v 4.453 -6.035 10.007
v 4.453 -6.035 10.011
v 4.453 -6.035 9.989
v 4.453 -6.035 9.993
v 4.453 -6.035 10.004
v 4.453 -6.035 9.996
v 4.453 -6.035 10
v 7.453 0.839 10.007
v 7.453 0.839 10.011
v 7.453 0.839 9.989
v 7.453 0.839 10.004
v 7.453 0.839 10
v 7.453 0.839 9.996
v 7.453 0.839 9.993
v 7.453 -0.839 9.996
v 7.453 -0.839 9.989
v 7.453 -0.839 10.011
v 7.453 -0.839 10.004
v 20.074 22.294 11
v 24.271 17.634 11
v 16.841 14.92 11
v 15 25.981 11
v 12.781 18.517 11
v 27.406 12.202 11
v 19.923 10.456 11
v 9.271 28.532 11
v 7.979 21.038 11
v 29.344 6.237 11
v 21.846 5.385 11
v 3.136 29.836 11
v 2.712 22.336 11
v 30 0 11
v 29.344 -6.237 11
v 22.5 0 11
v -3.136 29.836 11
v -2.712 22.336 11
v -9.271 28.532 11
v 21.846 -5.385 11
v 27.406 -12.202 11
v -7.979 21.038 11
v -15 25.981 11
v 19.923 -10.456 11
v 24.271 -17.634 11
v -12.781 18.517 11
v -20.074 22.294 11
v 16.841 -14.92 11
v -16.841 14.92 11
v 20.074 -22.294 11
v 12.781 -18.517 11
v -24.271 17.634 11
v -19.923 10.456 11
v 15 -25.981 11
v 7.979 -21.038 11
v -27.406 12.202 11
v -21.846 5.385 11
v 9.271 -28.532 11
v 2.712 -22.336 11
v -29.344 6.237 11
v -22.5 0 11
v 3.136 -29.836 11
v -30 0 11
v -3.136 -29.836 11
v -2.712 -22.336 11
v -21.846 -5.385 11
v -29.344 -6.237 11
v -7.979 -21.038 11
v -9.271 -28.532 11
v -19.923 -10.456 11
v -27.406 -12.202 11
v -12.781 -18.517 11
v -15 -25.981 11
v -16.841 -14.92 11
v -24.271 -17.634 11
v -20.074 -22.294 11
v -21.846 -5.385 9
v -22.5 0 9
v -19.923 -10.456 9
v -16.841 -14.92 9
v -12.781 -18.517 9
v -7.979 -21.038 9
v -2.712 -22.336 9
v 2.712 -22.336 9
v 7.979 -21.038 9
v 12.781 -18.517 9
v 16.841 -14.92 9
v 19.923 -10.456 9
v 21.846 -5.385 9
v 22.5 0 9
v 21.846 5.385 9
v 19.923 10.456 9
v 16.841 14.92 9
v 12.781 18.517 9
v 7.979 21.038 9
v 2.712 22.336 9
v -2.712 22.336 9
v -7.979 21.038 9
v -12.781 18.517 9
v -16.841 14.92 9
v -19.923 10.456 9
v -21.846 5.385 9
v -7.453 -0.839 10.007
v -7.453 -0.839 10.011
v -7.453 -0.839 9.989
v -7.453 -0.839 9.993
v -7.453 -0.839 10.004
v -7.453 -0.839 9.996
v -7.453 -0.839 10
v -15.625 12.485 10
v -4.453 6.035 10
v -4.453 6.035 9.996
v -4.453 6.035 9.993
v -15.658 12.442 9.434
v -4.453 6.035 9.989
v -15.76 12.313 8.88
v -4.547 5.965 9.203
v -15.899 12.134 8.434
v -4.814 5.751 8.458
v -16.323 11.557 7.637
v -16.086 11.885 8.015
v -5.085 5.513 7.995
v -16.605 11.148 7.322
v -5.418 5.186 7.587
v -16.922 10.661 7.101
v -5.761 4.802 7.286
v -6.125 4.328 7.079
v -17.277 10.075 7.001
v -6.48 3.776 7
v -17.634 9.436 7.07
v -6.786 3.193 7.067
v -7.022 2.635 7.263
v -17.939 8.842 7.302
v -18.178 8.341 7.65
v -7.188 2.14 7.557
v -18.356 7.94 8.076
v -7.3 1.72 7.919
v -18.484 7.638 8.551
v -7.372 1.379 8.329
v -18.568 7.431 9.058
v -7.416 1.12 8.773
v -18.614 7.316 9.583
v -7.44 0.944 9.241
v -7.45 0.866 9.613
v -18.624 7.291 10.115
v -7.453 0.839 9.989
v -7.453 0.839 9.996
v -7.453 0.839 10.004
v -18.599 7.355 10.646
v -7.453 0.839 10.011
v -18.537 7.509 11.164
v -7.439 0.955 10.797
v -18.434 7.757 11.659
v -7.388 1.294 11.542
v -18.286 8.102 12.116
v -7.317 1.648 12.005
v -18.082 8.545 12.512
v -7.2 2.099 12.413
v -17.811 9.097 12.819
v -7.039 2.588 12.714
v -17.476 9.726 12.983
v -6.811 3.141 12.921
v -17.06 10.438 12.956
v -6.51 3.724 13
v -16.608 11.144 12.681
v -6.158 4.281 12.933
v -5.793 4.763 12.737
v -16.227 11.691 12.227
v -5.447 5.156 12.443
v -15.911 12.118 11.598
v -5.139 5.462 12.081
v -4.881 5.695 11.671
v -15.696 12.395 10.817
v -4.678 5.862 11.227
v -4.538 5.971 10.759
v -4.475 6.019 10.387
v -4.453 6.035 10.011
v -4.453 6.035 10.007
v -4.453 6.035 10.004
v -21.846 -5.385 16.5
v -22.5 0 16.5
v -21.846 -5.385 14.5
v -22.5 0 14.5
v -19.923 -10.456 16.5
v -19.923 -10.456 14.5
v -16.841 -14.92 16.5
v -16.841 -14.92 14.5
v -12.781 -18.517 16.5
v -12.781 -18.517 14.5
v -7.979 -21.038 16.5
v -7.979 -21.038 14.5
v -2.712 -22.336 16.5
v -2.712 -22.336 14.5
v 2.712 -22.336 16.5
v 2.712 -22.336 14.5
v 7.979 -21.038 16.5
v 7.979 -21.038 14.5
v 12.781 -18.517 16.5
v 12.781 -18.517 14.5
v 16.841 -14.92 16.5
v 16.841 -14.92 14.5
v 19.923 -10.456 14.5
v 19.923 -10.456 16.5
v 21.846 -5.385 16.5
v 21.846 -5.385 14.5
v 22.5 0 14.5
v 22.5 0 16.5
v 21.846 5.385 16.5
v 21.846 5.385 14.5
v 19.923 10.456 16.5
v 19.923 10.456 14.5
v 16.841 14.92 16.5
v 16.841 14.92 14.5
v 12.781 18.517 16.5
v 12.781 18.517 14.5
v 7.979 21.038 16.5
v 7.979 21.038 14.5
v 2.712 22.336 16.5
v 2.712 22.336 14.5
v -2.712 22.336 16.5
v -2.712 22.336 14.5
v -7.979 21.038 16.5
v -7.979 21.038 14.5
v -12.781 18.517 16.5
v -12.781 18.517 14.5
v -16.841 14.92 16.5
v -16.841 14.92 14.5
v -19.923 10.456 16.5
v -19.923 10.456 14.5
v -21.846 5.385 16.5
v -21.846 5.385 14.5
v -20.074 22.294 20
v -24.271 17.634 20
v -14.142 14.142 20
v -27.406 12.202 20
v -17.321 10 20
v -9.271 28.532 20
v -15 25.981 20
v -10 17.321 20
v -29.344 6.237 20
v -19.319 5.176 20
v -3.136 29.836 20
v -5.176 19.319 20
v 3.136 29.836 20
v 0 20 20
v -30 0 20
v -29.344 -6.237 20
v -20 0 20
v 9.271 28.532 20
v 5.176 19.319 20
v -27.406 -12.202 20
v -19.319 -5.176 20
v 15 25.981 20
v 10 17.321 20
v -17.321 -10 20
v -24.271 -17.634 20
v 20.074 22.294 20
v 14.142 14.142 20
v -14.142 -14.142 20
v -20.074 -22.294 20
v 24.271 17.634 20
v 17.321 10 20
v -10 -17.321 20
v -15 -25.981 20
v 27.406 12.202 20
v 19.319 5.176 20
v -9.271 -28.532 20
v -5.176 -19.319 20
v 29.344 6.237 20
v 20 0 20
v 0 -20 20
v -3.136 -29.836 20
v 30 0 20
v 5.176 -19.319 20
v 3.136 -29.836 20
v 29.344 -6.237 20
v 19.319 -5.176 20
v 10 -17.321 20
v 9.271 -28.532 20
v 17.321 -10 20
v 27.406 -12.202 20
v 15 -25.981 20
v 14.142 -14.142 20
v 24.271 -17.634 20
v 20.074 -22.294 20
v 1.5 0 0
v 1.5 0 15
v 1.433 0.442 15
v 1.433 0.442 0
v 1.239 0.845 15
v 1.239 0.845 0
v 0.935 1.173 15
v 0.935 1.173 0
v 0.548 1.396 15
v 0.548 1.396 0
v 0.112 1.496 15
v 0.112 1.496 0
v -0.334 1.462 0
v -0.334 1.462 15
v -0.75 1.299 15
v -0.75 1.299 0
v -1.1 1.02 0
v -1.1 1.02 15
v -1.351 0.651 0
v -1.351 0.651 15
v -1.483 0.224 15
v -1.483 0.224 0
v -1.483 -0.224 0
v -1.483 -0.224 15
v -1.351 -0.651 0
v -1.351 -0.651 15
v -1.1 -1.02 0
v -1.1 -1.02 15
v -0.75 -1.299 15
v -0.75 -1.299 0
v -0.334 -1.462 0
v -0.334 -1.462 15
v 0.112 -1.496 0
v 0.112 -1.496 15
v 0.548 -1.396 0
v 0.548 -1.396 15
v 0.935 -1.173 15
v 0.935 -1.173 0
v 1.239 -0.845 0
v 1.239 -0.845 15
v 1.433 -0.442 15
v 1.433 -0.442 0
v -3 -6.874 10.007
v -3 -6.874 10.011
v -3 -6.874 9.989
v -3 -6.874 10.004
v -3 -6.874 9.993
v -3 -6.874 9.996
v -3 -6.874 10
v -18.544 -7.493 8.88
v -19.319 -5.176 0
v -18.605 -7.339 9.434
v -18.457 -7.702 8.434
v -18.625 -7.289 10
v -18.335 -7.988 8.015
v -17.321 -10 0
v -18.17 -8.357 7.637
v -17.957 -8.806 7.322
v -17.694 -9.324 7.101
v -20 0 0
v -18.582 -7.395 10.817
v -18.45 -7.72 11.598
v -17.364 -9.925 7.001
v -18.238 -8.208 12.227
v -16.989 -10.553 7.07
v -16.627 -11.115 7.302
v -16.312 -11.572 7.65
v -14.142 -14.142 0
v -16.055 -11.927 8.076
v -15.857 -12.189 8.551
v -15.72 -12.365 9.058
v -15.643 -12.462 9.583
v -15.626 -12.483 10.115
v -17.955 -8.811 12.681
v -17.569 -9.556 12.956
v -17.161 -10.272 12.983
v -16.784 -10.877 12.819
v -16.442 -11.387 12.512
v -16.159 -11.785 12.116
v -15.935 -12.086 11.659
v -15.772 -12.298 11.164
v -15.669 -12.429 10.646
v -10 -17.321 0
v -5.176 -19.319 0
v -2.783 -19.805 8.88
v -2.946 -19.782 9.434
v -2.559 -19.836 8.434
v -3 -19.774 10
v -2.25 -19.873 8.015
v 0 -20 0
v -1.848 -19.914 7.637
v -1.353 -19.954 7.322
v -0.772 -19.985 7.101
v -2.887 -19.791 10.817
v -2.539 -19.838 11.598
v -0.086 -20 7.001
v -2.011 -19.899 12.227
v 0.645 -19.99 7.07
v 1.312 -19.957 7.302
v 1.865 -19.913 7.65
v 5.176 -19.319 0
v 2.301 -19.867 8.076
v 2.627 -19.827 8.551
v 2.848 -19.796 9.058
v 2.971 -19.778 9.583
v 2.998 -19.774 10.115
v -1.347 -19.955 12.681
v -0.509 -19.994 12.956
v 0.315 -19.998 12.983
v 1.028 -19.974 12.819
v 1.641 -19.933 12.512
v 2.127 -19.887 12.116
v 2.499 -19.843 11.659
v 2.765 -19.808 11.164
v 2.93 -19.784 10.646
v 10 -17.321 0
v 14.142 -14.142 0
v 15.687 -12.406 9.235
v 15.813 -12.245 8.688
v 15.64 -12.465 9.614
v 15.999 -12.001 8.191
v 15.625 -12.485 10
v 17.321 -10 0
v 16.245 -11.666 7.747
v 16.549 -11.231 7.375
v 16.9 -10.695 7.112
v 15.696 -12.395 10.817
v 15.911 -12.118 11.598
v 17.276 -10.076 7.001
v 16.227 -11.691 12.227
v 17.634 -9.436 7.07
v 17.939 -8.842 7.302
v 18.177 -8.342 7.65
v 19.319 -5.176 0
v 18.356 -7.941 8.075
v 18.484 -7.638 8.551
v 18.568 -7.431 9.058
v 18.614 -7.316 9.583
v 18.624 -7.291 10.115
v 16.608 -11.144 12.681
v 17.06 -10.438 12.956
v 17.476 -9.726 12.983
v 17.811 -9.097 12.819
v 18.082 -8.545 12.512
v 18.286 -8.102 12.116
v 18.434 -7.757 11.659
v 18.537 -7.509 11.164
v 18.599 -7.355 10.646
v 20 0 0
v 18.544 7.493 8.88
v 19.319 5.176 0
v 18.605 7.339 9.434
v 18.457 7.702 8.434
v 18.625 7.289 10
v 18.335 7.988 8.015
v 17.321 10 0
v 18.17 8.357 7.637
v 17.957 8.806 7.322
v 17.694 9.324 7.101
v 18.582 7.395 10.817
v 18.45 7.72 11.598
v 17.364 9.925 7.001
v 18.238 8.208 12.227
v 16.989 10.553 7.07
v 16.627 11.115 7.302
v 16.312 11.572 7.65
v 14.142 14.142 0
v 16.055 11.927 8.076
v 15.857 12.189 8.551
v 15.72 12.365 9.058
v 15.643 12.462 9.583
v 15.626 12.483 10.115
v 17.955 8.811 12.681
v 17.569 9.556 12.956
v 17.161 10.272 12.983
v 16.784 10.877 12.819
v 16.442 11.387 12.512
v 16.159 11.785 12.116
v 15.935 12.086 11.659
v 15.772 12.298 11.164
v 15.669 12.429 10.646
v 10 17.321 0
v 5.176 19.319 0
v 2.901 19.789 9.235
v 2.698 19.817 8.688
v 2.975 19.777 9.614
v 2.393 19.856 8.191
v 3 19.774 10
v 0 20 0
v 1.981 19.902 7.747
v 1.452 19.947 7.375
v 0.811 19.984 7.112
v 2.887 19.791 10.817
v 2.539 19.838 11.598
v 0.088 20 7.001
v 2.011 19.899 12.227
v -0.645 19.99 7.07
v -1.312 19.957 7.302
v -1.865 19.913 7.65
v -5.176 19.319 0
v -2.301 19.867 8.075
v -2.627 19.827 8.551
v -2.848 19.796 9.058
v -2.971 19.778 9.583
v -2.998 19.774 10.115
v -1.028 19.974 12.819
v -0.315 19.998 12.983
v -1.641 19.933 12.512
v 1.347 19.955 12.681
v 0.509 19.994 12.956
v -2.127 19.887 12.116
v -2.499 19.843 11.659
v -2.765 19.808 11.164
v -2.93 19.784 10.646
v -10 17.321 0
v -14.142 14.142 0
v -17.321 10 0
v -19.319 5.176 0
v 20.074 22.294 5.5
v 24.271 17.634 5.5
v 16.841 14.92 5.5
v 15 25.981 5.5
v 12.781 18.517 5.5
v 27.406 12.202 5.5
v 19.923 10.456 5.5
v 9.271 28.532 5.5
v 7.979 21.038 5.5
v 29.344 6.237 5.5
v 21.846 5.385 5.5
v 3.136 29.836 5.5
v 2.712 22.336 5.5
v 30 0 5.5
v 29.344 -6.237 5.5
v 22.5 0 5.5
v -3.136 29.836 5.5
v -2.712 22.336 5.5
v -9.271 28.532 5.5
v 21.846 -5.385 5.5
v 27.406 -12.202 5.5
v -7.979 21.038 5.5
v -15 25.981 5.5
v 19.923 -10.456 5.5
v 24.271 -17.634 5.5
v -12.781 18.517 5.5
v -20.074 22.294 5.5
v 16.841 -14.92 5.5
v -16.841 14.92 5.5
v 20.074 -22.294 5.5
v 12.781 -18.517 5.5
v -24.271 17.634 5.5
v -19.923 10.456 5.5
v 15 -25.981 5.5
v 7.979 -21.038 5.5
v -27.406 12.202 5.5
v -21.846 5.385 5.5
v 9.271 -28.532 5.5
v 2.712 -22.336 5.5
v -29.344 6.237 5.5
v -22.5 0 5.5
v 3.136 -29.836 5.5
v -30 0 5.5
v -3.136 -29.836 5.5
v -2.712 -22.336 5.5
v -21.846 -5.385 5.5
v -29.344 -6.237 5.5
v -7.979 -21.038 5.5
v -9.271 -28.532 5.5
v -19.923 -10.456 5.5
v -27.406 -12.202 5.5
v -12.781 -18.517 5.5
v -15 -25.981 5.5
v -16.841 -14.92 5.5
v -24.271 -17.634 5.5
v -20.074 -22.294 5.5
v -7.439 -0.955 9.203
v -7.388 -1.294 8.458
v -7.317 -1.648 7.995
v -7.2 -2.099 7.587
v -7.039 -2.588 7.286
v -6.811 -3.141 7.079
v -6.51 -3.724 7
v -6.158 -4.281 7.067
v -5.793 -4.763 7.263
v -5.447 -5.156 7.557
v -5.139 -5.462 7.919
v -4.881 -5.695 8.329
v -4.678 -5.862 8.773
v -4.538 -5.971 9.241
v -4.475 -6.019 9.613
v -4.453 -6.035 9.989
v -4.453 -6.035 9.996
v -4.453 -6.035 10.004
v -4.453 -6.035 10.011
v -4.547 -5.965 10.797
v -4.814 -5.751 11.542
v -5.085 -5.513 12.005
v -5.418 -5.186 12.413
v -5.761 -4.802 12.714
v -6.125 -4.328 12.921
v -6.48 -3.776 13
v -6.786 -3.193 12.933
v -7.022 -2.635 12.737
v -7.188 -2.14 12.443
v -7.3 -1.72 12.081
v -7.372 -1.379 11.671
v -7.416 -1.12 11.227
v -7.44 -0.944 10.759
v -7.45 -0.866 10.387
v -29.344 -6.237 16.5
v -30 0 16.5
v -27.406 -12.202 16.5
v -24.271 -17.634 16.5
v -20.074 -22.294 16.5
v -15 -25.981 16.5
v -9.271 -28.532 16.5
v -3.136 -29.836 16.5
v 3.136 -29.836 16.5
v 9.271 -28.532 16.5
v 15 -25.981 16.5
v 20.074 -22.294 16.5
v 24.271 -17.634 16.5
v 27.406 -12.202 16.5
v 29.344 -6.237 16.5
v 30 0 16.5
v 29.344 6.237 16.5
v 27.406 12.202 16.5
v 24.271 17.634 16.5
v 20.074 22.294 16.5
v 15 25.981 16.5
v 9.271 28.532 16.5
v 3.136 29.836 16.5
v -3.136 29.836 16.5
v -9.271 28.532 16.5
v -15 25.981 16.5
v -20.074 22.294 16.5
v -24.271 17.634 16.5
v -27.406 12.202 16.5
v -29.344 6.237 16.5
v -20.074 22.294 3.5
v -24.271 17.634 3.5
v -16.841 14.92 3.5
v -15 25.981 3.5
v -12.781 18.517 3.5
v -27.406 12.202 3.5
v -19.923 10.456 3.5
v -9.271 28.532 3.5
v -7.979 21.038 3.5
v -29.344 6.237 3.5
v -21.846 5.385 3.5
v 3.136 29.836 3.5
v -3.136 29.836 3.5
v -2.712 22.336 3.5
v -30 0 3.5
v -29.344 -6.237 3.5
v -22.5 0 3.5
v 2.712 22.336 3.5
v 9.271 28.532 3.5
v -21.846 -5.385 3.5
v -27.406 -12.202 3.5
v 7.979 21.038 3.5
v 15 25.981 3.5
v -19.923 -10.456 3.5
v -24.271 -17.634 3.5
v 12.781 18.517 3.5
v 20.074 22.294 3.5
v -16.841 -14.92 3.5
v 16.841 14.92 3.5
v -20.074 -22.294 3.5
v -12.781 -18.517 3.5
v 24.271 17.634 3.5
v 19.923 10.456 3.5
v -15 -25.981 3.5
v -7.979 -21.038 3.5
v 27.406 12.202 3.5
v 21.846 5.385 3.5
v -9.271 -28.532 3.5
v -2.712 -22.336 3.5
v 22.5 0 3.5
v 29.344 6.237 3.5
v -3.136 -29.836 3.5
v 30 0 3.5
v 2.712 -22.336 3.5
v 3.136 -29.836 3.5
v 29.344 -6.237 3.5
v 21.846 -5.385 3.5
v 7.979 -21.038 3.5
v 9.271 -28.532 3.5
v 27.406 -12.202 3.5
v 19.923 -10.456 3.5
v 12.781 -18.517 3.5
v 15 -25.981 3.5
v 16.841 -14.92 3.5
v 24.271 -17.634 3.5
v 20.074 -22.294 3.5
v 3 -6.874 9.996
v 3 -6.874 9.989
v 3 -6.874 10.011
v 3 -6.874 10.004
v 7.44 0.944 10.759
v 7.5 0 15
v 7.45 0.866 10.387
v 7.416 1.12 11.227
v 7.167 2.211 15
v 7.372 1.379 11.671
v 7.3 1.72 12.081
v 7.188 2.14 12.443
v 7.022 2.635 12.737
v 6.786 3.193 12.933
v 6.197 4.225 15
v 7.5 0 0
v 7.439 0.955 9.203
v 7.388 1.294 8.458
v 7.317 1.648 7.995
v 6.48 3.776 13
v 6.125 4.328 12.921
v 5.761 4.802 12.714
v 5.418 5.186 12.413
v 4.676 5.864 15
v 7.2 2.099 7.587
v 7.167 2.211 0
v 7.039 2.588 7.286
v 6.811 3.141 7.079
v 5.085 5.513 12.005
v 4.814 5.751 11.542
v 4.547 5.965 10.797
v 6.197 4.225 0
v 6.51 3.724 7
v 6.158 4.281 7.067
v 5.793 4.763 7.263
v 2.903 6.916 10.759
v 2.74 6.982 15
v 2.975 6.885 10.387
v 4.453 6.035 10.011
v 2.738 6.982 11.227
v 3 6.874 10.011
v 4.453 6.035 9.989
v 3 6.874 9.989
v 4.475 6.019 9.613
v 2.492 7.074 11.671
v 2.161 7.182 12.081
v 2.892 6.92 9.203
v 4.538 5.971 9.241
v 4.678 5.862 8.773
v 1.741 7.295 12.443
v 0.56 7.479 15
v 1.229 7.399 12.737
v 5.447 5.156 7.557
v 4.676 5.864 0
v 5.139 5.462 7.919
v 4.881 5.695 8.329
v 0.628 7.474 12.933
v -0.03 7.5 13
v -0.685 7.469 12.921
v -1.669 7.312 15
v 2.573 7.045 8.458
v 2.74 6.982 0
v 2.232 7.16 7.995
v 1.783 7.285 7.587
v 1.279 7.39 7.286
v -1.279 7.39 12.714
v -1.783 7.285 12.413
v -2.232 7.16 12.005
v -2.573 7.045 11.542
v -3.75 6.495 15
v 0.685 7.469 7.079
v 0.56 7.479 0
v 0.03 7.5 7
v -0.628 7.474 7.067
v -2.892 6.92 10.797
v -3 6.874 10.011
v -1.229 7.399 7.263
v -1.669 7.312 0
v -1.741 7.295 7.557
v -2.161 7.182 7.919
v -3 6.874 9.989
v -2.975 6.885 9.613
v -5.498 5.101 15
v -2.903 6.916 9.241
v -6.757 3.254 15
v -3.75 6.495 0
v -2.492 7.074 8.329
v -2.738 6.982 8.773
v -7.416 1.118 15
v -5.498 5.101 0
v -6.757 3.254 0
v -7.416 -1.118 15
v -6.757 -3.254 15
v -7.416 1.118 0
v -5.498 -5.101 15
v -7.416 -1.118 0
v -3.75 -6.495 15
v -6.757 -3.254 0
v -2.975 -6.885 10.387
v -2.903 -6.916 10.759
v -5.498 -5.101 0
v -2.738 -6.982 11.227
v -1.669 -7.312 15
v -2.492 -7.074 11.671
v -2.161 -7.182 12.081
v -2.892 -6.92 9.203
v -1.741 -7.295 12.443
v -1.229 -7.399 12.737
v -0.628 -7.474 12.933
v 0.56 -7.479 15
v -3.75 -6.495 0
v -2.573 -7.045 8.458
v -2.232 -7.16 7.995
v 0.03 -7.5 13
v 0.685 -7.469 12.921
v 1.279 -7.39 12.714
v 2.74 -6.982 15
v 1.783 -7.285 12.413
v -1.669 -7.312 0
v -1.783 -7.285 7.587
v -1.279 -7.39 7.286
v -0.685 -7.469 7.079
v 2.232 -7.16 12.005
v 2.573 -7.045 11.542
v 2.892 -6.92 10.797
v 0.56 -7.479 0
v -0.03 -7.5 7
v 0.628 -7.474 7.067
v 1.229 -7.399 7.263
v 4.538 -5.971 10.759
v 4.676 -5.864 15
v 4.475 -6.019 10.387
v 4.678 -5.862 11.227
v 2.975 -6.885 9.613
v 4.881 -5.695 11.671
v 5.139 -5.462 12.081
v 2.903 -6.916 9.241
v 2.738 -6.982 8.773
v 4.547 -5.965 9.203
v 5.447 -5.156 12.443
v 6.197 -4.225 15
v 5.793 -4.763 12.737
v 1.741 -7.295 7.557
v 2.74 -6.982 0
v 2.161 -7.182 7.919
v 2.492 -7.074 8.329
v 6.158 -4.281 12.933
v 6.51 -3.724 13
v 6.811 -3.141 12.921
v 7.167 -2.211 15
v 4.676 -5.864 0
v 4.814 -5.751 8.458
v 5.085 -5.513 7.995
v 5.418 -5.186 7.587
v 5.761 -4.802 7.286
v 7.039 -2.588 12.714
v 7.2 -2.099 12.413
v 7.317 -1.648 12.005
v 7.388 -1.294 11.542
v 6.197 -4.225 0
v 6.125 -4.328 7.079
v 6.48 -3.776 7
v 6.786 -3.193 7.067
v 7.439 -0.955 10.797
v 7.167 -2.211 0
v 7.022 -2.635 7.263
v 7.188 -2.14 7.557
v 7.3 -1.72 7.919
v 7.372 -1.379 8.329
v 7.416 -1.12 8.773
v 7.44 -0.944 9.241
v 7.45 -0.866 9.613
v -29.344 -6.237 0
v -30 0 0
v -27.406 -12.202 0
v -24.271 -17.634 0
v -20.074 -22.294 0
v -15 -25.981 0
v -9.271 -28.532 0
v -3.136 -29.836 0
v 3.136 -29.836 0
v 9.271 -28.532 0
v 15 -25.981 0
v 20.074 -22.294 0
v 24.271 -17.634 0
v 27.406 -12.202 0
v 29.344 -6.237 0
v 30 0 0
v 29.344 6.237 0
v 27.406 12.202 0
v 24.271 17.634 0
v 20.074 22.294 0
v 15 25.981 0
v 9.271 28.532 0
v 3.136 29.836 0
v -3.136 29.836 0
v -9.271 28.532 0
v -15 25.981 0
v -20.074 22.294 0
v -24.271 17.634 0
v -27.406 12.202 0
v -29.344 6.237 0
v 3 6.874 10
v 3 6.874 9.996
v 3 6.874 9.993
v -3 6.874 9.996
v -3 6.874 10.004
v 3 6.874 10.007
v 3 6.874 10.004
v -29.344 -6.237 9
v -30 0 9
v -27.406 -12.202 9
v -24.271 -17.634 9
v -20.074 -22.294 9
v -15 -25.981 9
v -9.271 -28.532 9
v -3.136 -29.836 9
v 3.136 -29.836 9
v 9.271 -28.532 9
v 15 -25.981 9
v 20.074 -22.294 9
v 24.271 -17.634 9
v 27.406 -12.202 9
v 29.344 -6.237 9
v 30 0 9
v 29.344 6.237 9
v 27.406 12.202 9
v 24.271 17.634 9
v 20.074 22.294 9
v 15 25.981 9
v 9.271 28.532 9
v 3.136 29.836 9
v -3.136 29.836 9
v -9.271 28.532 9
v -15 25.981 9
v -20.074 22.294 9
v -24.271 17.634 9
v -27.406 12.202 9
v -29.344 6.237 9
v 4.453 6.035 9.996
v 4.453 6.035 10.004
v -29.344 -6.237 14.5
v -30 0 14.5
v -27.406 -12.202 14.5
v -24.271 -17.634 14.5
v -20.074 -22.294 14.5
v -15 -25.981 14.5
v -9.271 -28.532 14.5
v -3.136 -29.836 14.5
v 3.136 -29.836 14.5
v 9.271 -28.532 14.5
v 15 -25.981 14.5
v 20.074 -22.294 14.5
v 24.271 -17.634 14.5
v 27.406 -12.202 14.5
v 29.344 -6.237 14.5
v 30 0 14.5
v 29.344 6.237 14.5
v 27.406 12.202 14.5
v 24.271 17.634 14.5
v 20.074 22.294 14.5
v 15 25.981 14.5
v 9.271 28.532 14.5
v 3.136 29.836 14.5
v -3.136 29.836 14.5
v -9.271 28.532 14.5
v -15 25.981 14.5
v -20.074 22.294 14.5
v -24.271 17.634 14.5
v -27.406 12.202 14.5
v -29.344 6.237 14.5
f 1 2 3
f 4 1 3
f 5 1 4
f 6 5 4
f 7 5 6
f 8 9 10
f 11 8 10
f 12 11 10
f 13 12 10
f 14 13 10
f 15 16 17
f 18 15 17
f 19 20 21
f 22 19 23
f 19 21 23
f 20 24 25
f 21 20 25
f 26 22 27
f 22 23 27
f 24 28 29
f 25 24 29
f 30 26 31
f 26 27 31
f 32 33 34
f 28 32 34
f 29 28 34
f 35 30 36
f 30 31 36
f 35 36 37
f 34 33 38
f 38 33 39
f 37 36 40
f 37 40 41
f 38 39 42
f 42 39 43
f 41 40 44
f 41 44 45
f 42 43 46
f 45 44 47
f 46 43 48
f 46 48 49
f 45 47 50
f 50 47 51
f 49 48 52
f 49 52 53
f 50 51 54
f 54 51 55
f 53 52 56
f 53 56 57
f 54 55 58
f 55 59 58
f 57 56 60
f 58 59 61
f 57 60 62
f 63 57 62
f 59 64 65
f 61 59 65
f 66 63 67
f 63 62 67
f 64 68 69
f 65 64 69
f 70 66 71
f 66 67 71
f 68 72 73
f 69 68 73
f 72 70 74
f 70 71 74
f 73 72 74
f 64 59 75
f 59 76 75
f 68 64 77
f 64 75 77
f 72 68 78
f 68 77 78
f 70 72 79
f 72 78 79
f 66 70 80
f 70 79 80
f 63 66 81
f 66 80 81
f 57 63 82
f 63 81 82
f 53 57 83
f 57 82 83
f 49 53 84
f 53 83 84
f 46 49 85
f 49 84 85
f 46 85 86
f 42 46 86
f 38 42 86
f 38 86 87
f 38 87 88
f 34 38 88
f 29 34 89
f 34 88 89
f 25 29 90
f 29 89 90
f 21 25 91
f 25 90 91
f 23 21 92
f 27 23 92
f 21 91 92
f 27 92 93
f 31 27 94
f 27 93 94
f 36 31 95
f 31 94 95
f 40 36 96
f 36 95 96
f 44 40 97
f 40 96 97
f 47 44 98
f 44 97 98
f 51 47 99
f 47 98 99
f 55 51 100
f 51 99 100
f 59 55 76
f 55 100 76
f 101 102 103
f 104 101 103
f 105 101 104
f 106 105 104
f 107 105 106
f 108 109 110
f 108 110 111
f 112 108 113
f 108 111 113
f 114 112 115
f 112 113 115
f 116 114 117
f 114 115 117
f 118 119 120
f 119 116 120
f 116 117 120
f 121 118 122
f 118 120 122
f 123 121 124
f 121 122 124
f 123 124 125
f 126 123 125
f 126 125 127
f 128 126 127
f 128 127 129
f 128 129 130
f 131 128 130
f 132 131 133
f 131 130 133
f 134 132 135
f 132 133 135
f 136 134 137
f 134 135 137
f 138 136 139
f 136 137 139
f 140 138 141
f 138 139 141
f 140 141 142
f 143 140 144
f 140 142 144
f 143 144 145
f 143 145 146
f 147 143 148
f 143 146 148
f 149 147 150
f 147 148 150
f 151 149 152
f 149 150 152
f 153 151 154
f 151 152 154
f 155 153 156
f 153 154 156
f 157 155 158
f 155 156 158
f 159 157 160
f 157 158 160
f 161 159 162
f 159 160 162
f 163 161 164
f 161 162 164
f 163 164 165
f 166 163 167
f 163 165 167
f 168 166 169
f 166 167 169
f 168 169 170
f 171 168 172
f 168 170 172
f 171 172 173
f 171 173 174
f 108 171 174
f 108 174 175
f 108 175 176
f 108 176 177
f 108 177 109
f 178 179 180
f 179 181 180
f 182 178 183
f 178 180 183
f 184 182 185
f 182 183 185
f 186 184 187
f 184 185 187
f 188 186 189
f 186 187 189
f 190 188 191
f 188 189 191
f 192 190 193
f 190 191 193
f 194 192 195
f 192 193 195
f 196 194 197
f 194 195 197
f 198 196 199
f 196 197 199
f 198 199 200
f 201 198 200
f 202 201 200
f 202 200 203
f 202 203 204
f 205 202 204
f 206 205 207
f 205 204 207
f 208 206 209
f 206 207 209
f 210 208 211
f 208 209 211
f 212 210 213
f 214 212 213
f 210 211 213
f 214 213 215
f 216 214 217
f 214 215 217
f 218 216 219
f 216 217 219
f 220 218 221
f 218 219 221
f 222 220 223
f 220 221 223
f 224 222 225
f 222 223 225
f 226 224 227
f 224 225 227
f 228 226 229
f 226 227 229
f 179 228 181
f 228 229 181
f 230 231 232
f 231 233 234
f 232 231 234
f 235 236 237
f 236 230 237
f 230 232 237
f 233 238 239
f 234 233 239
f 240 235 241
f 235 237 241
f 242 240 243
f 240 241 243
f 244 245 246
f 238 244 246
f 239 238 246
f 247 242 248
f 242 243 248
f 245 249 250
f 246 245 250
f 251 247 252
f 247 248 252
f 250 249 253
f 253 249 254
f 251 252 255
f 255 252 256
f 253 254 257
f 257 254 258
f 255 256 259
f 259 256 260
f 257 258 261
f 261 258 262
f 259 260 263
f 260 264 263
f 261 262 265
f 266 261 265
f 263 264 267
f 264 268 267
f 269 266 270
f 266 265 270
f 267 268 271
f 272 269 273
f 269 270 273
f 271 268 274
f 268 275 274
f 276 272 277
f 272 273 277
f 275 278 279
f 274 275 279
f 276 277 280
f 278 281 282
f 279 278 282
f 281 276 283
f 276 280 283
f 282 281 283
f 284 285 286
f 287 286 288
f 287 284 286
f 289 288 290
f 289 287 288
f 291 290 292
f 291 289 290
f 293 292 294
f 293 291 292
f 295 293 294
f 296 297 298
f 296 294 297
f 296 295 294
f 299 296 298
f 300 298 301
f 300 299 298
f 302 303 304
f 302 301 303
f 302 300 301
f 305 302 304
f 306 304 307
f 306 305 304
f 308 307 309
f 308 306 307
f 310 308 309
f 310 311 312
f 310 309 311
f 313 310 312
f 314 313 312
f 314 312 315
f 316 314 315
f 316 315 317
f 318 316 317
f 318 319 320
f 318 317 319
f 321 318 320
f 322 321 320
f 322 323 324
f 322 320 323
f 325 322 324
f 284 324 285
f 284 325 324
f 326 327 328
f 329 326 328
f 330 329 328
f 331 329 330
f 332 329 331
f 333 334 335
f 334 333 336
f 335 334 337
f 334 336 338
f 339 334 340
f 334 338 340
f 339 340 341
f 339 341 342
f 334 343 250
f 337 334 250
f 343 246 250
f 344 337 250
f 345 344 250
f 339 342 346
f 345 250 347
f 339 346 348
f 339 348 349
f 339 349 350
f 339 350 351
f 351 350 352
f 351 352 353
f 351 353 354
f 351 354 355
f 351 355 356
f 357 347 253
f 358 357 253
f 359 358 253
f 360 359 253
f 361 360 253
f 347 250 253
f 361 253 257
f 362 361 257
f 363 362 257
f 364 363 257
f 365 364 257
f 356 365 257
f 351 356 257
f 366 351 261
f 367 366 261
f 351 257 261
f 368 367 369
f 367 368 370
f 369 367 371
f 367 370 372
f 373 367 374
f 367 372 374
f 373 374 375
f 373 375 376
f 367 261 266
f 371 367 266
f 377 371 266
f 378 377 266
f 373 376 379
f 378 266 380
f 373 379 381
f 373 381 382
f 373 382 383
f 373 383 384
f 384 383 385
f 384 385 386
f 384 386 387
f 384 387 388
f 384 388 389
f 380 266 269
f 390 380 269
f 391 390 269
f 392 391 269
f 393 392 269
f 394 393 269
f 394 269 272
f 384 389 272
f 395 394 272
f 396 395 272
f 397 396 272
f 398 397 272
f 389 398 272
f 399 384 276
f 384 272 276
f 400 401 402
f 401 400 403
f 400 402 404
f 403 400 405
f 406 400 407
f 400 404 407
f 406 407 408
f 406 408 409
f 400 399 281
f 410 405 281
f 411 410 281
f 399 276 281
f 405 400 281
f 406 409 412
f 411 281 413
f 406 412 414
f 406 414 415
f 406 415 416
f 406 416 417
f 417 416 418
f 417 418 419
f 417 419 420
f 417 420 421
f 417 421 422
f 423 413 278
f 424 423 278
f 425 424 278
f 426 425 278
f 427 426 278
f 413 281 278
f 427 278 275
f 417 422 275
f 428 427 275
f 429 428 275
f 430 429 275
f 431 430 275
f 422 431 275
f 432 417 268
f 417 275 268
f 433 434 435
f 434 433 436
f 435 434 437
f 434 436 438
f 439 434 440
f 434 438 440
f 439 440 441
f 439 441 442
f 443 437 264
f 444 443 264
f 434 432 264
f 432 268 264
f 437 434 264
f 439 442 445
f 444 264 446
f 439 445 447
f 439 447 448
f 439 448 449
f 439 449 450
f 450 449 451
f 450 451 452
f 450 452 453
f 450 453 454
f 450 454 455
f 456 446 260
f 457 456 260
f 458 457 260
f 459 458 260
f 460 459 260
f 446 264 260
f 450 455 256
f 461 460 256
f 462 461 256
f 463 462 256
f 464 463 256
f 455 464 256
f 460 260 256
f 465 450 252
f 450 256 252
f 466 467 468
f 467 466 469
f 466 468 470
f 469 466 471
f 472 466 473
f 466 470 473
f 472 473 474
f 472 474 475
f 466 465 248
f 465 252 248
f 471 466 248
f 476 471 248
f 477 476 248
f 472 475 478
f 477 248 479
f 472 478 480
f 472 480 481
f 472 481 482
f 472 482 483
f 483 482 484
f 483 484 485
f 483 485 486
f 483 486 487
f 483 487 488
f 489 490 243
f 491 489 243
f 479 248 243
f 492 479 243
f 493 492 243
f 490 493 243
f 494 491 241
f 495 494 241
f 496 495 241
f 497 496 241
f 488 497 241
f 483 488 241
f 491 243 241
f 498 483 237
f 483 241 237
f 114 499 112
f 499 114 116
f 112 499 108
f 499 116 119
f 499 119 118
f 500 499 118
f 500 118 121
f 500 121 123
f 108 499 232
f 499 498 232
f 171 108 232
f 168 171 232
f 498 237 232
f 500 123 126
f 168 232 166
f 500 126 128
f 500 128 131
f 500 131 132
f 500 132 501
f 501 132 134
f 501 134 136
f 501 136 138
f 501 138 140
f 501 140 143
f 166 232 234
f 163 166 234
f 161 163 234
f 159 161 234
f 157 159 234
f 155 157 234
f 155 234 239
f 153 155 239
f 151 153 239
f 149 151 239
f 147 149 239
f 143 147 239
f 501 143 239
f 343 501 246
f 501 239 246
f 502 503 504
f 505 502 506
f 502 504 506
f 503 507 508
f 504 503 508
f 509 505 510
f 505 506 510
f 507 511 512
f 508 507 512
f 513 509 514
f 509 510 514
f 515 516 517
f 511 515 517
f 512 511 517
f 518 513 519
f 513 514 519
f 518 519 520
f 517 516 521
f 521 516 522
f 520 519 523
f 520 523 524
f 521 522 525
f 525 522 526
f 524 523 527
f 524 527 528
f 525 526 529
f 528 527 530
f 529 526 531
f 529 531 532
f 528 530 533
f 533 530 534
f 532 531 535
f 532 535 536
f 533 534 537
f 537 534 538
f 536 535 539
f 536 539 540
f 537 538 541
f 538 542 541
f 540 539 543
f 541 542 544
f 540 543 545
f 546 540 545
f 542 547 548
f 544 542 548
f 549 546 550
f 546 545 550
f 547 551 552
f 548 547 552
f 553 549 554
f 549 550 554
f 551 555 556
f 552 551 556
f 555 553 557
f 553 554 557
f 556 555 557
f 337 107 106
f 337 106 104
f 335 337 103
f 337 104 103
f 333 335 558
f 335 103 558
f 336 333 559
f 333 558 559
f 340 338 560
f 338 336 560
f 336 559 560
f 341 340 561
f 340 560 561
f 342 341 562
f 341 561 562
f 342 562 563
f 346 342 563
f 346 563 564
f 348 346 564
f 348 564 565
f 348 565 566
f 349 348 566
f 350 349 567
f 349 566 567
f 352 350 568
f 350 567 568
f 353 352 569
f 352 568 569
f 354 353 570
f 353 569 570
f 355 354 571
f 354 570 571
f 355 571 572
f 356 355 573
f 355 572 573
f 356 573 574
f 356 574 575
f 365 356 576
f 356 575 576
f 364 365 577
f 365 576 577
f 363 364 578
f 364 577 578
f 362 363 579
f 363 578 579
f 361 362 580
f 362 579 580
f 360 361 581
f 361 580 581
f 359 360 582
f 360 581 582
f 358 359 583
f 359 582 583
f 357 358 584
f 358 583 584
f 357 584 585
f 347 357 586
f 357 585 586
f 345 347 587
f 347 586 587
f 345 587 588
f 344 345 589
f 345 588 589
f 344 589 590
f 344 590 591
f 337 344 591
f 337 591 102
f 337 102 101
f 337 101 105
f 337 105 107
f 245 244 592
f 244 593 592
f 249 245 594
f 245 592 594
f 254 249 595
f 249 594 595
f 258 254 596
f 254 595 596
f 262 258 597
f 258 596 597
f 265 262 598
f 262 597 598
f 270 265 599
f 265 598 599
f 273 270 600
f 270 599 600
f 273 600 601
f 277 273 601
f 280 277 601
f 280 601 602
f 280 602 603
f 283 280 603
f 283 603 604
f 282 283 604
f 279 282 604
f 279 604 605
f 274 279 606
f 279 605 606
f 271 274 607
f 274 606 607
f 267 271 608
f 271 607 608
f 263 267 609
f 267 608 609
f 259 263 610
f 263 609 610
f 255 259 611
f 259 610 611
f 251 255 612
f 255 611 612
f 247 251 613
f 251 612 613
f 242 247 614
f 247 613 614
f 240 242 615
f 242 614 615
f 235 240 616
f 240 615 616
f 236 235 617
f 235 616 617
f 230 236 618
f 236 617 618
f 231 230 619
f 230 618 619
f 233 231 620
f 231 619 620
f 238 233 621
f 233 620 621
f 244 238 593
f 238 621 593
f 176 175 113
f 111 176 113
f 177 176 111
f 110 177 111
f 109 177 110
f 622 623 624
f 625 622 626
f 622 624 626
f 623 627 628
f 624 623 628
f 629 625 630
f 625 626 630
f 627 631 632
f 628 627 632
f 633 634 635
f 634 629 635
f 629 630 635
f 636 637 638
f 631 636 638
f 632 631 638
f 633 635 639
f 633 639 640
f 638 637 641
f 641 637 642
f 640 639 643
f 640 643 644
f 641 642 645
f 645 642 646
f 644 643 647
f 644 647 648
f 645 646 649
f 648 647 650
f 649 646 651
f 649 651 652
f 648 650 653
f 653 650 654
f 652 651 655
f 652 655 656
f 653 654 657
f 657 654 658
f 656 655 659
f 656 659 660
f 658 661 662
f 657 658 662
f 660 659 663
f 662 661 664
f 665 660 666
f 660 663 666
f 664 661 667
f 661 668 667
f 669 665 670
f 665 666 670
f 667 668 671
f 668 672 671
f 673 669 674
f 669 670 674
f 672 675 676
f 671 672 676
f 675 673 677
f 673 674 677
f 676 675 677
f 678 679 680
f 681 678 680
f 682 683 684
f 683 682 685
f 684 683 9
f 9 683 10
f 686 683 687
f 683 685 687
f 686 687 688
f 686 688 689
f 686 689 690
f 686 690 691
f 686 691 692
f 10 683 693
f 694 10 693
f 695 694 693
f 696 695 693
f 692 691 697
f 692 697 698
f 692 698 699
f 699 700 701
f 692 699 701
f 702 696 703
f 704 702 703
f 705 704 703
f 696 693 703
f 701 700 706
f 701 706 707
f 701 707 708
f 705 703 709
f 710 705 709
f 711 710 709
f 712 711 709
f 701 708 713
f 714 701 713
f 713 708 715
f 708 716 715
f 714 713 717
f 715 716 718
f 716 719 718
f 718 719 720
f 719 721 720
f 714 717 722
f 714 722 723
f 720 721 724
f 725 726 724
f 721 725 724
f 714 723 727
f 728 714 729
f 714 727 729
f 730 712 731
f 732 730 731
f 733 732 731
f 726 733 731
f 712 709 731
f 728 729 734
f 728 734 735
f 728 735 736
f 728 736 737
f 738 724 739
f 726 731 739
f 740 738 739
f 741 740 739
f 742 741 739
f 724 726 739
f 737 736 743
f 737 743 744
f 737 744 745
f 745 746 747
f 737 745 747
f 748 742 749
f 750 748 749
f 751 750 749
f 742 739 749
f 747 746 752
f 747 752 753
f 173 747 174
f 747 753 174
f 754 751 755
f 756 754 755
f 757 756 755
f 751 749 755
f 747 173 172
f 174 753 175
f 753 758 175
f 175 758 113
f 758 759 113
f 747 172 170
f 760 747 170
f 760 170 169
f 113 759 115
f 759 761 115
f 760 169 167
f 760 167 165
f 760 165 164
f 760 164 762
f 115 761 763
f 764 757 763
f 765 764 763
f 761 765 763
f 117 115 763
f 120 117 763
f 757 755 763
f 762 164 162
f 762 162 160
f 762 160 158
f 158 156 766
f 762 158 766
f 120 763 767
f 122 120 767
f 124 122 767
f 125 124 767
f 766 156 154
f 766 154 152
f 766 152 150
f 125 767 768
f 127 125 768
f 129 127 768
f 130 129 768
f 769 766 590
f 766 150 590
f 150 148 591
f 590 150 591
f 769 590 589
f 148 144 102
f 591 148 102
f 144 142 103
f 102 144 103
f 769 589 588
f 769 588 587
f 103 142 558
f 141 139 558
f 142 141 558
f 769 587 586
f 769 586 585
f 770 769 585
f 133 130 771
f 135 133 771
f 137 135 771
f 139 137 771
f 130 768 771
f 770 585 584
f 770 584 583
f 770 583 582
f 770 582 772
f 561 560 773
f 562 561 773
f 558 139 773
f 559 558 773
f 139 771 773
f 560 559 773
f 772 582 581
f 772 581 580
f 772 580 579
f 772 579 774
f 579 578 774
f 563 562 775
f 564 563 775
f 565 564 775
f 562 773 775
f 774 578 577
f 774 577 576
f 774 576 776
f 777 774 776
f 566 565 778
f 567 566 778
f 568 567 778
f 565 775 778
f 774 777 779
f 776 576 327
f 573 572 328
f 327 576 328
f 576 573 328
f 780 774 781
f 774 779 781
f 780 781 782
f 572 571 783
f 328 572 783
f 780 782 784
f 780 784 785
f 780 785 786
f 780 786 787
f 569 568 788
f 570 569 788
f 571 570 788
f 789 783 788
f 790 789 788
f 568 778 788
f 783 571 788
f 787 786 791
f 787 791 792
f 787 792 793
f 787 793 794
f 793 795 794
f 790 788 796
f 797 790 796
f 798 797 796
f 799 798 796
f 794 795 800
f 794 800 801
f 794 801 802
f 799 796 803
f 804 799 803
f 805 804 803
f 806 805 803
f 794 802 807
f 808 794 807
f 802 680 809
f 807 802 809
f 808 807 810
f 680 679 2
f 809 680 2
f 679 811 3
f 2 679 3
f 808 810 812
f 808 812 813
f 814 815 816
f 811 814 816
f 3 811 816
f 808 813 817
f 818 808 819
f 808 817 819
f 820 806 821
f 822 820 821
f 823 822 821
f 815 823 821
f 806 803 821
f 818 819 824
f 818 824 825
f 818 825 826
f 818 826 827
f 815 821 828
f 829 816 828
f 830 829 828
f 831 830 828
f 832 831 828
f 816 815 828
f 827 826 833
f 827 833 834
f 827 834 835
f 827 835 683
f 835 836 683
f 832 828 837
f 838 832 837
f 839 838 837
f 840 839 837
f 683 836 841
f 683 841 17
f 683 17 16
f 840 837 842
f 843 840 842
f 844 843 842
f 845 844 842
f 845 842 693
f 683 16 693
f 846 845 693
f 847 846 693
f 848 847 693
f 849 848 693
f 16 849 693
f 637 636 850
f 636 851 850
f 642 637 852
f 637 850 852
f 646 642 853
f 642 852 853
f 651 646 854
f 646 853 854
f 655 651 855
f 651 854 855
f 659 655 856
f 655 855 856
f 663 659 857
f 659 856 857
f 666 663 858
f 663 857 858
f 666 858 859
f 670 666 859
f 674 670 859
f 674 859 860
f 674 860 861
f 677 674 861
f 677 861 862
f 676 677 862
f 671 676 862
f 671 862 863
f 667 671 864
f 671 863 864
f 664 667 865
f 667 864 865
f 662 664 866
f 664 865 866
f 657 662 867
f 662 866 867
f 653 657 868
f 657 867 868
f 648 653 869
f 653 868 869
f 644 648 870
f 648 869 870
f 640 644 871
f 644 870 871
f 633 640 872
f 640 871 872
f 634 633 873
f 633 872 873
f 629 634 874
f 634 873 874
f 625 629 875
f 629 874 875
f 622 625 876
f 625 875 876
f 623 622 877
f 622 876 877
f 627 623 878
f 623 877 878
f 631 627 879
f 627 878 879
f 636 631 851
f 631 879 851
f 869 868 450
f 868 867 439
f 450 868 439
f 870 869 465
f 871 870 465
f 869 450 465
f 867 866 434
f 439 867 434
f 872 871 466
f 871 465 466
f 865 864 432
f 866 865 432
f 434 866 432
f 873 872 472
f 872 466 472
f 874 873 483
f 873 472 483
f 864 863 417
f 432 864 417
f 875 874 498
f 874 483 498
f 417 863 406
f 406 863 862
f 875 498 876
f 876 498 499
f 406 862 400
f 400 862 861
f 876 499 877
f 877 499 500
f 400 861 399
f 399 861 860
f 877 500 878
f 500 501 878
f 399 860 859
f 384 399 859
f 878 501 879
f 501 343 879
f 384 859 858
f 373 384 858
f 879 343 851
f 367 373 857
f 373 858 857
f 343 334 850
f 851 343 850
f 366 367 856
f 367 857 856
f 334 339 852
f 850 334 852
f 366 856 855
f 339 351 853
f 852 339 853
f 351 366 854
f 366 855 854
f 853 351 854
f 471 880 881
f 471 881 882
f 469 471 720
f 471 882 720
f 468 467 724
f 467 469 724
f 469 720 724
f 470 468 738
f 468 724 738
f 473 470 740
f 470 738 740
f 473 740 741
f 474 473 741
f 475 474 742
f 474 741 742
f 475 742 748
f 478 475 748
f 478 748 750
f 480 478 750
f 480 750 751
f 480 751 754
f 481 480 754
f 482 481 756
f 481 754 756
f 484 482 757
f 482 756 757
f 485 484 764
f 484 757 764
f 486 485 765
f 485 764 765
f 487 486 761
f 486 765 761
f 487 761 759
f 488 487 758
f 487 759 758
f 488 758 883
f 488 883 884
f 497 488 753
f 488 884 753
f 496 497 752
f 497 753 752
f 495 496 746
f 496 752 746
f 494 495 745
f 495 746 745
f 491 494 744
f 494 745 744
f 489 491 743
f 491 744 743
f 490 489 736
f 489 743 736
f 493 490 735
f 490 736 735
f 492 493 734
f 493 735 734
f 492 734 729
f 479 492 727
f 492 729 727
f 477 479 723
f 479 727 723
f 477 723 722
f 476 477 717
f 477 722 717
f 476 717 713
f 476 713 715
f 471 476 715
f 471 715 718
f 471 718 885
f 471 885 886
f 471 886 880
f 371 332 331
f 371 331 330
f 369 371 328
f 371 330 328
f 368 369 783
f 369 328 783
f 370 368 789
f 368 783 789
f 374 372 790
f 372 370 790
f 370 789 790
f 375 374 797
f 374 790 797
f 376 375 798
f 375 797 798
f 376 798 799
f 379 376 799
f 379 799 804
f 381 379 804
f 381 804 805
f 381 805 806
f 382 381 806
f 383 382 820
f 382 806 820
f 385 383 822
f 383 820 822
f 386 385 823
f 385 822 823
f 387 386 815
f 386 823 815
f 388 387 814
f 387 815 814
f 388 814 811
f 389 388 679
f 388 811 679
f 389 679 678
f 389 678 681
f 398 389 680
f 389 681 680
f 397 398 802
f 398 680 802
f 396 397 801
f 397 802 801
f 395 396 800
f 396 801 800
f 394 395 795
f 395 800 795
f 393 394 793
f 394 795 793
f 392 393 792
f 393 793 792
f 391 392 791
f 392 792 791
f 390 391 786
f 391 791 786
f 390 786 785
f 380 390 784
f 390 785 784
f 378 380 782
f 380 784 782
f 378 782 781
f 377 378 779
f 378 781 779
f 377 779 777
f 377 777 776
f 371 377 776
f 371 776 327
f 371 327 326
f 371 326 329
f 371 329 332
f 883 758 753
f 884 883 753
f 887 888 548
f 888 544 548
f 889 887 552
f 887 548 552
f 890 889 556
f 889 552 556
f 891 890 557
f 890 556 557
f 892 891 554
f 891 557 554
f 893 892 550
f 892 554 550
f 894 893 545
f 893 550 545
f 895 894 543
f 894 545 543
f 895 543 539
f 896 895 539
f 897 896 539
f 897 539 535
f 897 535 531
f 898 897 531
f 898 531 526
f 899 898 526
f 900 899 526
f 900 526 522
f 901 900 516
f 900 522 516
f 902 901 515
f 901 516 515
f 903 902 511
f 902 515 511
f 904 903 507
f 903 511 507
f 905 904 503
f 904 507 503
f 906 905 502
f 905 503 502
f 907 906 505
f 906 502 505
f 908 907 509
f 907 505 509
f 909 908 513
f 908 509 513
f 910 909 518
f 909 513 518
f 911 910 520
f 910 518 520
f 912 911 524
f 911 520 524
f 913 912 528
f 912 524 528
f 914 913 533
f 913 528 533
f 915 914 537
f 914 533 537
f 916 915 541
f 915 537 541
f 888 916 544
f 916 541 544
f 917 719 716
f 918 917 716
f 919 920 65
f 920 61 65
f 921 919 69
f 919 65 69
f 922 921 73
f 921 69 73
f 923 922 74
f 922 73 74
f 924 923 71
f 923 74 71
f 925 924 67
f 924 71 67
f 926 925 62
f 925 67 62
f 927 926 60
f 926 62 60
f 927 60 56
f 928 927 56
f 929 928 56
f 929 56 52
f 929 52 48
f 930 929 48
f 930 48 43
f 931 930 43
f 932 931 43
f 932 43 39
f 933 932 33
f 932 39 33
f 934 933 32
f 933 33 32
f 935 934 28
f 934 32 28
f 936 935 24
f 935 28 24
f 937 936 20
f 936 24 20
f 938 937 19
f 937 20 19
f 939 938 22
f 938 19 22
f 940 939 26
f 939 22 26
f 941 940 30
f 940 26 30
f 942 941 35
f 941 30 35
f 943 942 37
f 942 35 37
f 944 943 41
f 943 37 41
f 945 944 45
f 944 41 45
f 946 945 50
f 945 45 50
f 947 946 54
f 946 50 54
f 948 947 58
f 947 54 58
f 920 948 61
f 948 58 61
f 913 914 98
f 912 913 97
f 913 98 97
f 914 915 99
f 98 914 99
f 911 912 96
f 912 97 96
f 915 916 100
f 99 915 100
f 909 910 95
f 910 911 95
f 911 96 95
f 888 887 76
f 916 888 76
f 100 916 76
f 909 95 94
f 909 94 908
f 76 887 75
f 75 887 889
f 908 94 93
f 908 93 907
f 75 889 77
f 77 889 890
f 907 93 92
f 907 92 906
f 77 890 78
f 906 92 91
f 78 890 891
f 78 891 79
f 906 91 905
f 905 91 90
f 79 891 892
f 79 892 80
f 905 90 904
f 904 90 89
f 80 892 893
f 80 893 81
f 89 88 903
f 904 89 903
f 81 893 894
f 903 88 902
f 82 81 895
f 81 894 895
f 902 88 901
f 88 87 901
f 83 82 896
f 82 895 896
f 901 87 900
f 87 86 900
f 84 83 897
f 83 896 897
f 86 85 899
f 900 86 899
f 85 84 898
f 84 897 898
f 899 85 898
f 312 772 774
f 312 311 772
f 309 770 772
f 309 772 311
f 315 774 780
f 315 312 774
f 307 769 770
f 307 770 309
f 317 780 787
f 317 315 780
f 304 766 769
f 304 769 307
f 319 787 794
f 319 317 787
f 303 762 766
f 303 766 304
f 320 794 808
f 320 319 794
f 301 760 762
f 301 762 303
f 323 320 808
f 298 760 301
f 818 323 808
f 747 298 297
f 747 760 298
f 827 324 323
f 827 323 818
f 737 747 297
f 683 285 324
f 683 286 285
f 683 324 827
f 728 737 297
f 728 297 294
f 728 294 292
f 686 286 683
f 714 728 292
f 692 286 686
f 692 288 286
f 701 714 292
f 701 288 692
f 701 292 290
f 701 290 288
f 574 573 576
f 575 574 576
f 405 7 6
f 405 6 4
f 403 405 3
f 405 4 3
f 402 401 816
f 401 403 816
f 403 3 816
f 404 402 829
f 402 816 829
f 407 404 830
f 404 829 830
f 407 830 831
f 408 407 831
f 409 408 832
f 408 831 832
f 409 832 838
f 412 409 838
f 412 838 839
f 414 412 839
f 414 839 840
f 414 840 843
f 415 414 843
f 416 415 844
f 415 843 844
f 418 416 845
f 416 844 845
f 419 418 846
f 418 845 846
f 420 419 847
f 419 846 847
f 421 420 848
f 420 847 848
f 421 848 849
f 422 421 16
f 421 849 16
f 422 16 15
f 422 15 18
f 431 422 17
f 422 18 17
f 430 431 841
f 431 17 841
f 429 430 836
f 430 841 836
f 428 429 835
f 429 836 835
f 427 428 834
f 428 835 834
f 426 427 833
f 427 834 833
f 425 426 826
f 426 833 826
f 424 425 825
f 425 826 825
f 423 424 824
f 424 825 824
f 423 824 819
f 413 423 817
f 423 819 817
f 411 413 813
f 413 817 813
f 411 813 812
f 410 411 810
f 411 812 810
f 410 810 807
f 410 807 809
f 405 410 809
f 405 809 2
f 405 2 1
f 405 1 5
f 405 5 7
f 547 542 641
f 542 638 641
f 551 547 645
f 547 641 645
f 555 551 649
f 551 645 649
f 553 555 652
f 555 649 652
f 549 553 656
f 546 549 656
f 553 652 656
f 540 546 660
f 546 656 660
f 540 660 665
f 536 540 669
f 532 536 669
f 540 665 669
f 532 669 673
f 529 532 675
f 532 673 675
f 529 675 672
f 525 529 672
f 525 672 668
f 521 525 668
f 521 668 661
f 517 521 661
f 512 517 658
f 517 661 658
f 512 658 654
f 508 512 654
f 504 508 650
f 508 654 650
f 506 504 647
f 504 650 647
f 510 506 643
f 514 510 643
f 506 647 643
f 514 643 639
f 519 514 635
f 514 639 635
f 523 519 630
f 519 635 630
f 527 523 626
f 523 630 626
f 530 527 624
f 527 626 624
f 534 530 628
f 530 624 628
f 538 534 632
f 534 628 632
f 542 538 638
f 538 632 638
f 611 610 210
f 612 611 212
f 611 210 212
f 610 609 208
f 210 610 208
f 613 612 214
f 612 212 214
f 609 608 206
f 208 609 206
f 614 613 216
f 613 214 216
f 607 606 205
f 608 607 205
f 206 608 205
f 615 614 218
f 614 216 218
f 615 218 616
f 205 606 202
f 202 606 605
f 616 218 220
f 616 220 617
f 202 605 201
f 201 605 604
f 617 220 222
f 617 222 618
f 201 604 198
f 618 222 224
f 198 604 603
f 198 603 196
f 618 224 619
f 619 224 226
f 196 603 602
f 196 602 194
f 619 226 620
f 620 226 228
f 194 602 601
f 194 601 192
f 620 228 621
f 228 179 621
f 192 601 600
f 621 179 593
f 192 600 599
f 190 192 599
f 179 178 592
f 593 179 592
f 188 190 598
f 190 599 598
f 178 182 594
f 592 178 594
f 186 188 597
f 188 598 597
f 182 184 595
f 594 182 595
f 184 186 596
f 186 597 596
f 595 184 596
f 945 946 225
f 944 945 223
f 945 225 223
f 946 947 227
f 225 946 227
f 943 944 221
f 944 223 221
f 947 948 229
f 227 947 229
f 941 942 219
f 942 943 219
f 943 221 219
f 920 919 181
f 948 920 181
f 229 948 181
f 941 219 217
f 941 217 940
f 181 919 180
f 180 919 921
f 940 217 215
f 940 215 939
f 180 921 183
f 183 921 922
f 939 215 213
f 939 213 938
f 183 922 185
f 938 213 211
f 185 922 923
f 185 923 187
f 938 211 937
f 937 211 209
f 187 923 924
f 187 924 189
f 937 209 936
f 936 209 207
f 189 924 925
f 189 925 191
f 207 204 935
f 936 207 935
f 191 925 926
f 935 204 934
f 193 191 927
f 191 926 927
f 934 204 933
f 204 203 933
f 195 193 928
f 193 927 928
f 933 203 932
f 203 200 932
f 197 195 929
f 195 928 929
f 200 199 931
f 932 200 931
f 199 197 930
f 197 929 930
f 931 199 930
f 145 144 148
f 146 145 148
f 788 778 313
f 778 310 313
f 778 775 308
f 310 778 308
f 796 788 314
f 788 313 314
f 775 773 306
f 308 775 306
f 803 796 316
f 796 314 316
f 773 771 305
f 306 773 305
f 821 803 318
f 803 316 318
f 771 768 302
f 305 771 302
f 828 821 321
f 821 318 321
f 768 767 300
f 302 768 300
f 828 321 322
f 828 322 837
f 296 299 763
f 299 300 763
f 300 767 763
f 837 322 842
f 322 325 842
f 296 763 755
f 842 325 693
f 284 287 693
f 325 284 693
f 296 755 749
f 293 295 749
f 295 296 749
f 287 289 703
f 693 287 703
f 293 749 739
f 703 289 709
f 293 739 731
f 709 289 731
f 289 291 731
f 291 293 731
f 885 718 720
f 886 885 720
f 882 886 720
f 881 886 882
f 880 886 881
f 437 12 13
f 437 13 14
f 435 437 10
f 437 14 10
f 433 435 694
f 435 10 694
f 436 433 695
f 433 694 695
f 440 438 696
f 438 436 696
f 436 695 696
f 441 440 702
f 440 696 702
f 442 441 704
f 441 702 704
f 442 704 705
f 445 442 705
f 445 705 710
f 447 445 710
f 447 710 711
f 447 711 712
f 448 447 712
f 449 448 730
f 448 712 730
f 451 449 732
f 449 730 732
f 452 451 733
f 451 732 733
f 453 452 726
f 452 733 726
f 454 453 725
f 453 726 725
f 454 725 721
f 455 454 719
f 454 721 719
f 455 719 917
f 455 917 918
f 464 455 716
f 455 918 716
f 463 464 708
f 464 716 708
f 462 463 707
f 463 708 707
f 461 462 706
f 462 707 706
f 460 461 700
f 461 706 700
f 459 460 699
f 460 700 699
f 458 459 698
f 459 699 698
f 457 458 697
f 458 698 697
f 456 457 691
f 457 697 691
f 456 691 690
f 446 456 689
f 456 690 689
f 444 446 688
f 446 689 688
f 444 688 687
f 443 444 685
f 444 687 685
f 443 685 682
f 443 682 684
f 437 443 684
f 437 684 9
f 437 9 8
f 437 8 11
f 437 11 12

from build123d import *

# Parameters (mm, degrees)
SKETCH_1_R               = 7.5
SKETCH_1_R_2             = 1.5
EXTRUDE_1_DEPTH          = 20
EXTRUDE_START            = -5.126128
SKETCH_5_R               = 3
EXTRUDE_3_DEPTH          = 13.126128
PATTERN_CIRCULAR_1_COUNT = 6
SKETCH_6_R               = 7.5
CUT_EXTRUDE_1_DEPTH      = 5


with BuildPart() as part:
    # 草圖1 → 填料-伸長1 (new body)
    with BuildSketch(Plane.XY):
        Circle(SKETCH_1_R)
        Circle(SKETCH_1_R_2, mode=Mode.SUBTRACT)
    extrude(amount=EXTRUDE_1_DEPTH)



with BuildPart() as body_2:
    # 草圖2 → 旋轉2 (revolve)
    with BuildSketch(Plane(origin=(0, 0, 0), x_dir=(1, 0, 0), z_dir=(0, 1, 0))):
        Polygon((-30, 0), (-20, 0), (-20, -20), (-30, -20), (-30, -16.5), (-22.5, -16.5), (-22.5, -14.5), (-30, -14.5), (-30, -11), (-22.5, -11), (-22.5, -9), (-30, -9), (-30, -5.5), (-22.5, -5.5), (-22.5, -3.5), (-30, -3.5), align=None)
    revolve(axis=Axis((0, 0, -16.060558383), (0, 0, 1)))


with BuildPart() as part_1:
    add(part.part)

    add(body_2.part)  # 填料-伸長3 merges body 2
    # 草圖5 → 填料-伸長3 (add)
    with BuildSketch(Plane(origin=(0, 12, 0), x_dir=(1, 0, 0), z_dir=(0, 1, 0)).offset(EXTRUDE_START)):
        with Locations((0, -10)):
            Circle(SKETCH_5_R)
    extrude_3 = extrude(amount=EXTRUDE_3_DEPTH)

    # 環狀複製排列1: 填料-伸長3 ×6 about axis
    pattern_circular_1_axis = Axis((0, 0, 20), (0, 0, -1))
    for i in range(1, PATTERN_CIRCULAR_1_COUNT):
        add(extrude_3.rotate(pattern_circular_1_axis, i * 360 / PATTERN_CIRCULAR_1_COUNT))

    # 草圖6 → 除料-伸長1 (cut)
    with BuildSketch(Plane.XY.offset(20)):
        Circle(SKETCH_6_R)
    extrude(amount=-CUT_EXTRUDE_1_DEPTH, mode=Mode.SUBTRACT)


solid = part_1.part
